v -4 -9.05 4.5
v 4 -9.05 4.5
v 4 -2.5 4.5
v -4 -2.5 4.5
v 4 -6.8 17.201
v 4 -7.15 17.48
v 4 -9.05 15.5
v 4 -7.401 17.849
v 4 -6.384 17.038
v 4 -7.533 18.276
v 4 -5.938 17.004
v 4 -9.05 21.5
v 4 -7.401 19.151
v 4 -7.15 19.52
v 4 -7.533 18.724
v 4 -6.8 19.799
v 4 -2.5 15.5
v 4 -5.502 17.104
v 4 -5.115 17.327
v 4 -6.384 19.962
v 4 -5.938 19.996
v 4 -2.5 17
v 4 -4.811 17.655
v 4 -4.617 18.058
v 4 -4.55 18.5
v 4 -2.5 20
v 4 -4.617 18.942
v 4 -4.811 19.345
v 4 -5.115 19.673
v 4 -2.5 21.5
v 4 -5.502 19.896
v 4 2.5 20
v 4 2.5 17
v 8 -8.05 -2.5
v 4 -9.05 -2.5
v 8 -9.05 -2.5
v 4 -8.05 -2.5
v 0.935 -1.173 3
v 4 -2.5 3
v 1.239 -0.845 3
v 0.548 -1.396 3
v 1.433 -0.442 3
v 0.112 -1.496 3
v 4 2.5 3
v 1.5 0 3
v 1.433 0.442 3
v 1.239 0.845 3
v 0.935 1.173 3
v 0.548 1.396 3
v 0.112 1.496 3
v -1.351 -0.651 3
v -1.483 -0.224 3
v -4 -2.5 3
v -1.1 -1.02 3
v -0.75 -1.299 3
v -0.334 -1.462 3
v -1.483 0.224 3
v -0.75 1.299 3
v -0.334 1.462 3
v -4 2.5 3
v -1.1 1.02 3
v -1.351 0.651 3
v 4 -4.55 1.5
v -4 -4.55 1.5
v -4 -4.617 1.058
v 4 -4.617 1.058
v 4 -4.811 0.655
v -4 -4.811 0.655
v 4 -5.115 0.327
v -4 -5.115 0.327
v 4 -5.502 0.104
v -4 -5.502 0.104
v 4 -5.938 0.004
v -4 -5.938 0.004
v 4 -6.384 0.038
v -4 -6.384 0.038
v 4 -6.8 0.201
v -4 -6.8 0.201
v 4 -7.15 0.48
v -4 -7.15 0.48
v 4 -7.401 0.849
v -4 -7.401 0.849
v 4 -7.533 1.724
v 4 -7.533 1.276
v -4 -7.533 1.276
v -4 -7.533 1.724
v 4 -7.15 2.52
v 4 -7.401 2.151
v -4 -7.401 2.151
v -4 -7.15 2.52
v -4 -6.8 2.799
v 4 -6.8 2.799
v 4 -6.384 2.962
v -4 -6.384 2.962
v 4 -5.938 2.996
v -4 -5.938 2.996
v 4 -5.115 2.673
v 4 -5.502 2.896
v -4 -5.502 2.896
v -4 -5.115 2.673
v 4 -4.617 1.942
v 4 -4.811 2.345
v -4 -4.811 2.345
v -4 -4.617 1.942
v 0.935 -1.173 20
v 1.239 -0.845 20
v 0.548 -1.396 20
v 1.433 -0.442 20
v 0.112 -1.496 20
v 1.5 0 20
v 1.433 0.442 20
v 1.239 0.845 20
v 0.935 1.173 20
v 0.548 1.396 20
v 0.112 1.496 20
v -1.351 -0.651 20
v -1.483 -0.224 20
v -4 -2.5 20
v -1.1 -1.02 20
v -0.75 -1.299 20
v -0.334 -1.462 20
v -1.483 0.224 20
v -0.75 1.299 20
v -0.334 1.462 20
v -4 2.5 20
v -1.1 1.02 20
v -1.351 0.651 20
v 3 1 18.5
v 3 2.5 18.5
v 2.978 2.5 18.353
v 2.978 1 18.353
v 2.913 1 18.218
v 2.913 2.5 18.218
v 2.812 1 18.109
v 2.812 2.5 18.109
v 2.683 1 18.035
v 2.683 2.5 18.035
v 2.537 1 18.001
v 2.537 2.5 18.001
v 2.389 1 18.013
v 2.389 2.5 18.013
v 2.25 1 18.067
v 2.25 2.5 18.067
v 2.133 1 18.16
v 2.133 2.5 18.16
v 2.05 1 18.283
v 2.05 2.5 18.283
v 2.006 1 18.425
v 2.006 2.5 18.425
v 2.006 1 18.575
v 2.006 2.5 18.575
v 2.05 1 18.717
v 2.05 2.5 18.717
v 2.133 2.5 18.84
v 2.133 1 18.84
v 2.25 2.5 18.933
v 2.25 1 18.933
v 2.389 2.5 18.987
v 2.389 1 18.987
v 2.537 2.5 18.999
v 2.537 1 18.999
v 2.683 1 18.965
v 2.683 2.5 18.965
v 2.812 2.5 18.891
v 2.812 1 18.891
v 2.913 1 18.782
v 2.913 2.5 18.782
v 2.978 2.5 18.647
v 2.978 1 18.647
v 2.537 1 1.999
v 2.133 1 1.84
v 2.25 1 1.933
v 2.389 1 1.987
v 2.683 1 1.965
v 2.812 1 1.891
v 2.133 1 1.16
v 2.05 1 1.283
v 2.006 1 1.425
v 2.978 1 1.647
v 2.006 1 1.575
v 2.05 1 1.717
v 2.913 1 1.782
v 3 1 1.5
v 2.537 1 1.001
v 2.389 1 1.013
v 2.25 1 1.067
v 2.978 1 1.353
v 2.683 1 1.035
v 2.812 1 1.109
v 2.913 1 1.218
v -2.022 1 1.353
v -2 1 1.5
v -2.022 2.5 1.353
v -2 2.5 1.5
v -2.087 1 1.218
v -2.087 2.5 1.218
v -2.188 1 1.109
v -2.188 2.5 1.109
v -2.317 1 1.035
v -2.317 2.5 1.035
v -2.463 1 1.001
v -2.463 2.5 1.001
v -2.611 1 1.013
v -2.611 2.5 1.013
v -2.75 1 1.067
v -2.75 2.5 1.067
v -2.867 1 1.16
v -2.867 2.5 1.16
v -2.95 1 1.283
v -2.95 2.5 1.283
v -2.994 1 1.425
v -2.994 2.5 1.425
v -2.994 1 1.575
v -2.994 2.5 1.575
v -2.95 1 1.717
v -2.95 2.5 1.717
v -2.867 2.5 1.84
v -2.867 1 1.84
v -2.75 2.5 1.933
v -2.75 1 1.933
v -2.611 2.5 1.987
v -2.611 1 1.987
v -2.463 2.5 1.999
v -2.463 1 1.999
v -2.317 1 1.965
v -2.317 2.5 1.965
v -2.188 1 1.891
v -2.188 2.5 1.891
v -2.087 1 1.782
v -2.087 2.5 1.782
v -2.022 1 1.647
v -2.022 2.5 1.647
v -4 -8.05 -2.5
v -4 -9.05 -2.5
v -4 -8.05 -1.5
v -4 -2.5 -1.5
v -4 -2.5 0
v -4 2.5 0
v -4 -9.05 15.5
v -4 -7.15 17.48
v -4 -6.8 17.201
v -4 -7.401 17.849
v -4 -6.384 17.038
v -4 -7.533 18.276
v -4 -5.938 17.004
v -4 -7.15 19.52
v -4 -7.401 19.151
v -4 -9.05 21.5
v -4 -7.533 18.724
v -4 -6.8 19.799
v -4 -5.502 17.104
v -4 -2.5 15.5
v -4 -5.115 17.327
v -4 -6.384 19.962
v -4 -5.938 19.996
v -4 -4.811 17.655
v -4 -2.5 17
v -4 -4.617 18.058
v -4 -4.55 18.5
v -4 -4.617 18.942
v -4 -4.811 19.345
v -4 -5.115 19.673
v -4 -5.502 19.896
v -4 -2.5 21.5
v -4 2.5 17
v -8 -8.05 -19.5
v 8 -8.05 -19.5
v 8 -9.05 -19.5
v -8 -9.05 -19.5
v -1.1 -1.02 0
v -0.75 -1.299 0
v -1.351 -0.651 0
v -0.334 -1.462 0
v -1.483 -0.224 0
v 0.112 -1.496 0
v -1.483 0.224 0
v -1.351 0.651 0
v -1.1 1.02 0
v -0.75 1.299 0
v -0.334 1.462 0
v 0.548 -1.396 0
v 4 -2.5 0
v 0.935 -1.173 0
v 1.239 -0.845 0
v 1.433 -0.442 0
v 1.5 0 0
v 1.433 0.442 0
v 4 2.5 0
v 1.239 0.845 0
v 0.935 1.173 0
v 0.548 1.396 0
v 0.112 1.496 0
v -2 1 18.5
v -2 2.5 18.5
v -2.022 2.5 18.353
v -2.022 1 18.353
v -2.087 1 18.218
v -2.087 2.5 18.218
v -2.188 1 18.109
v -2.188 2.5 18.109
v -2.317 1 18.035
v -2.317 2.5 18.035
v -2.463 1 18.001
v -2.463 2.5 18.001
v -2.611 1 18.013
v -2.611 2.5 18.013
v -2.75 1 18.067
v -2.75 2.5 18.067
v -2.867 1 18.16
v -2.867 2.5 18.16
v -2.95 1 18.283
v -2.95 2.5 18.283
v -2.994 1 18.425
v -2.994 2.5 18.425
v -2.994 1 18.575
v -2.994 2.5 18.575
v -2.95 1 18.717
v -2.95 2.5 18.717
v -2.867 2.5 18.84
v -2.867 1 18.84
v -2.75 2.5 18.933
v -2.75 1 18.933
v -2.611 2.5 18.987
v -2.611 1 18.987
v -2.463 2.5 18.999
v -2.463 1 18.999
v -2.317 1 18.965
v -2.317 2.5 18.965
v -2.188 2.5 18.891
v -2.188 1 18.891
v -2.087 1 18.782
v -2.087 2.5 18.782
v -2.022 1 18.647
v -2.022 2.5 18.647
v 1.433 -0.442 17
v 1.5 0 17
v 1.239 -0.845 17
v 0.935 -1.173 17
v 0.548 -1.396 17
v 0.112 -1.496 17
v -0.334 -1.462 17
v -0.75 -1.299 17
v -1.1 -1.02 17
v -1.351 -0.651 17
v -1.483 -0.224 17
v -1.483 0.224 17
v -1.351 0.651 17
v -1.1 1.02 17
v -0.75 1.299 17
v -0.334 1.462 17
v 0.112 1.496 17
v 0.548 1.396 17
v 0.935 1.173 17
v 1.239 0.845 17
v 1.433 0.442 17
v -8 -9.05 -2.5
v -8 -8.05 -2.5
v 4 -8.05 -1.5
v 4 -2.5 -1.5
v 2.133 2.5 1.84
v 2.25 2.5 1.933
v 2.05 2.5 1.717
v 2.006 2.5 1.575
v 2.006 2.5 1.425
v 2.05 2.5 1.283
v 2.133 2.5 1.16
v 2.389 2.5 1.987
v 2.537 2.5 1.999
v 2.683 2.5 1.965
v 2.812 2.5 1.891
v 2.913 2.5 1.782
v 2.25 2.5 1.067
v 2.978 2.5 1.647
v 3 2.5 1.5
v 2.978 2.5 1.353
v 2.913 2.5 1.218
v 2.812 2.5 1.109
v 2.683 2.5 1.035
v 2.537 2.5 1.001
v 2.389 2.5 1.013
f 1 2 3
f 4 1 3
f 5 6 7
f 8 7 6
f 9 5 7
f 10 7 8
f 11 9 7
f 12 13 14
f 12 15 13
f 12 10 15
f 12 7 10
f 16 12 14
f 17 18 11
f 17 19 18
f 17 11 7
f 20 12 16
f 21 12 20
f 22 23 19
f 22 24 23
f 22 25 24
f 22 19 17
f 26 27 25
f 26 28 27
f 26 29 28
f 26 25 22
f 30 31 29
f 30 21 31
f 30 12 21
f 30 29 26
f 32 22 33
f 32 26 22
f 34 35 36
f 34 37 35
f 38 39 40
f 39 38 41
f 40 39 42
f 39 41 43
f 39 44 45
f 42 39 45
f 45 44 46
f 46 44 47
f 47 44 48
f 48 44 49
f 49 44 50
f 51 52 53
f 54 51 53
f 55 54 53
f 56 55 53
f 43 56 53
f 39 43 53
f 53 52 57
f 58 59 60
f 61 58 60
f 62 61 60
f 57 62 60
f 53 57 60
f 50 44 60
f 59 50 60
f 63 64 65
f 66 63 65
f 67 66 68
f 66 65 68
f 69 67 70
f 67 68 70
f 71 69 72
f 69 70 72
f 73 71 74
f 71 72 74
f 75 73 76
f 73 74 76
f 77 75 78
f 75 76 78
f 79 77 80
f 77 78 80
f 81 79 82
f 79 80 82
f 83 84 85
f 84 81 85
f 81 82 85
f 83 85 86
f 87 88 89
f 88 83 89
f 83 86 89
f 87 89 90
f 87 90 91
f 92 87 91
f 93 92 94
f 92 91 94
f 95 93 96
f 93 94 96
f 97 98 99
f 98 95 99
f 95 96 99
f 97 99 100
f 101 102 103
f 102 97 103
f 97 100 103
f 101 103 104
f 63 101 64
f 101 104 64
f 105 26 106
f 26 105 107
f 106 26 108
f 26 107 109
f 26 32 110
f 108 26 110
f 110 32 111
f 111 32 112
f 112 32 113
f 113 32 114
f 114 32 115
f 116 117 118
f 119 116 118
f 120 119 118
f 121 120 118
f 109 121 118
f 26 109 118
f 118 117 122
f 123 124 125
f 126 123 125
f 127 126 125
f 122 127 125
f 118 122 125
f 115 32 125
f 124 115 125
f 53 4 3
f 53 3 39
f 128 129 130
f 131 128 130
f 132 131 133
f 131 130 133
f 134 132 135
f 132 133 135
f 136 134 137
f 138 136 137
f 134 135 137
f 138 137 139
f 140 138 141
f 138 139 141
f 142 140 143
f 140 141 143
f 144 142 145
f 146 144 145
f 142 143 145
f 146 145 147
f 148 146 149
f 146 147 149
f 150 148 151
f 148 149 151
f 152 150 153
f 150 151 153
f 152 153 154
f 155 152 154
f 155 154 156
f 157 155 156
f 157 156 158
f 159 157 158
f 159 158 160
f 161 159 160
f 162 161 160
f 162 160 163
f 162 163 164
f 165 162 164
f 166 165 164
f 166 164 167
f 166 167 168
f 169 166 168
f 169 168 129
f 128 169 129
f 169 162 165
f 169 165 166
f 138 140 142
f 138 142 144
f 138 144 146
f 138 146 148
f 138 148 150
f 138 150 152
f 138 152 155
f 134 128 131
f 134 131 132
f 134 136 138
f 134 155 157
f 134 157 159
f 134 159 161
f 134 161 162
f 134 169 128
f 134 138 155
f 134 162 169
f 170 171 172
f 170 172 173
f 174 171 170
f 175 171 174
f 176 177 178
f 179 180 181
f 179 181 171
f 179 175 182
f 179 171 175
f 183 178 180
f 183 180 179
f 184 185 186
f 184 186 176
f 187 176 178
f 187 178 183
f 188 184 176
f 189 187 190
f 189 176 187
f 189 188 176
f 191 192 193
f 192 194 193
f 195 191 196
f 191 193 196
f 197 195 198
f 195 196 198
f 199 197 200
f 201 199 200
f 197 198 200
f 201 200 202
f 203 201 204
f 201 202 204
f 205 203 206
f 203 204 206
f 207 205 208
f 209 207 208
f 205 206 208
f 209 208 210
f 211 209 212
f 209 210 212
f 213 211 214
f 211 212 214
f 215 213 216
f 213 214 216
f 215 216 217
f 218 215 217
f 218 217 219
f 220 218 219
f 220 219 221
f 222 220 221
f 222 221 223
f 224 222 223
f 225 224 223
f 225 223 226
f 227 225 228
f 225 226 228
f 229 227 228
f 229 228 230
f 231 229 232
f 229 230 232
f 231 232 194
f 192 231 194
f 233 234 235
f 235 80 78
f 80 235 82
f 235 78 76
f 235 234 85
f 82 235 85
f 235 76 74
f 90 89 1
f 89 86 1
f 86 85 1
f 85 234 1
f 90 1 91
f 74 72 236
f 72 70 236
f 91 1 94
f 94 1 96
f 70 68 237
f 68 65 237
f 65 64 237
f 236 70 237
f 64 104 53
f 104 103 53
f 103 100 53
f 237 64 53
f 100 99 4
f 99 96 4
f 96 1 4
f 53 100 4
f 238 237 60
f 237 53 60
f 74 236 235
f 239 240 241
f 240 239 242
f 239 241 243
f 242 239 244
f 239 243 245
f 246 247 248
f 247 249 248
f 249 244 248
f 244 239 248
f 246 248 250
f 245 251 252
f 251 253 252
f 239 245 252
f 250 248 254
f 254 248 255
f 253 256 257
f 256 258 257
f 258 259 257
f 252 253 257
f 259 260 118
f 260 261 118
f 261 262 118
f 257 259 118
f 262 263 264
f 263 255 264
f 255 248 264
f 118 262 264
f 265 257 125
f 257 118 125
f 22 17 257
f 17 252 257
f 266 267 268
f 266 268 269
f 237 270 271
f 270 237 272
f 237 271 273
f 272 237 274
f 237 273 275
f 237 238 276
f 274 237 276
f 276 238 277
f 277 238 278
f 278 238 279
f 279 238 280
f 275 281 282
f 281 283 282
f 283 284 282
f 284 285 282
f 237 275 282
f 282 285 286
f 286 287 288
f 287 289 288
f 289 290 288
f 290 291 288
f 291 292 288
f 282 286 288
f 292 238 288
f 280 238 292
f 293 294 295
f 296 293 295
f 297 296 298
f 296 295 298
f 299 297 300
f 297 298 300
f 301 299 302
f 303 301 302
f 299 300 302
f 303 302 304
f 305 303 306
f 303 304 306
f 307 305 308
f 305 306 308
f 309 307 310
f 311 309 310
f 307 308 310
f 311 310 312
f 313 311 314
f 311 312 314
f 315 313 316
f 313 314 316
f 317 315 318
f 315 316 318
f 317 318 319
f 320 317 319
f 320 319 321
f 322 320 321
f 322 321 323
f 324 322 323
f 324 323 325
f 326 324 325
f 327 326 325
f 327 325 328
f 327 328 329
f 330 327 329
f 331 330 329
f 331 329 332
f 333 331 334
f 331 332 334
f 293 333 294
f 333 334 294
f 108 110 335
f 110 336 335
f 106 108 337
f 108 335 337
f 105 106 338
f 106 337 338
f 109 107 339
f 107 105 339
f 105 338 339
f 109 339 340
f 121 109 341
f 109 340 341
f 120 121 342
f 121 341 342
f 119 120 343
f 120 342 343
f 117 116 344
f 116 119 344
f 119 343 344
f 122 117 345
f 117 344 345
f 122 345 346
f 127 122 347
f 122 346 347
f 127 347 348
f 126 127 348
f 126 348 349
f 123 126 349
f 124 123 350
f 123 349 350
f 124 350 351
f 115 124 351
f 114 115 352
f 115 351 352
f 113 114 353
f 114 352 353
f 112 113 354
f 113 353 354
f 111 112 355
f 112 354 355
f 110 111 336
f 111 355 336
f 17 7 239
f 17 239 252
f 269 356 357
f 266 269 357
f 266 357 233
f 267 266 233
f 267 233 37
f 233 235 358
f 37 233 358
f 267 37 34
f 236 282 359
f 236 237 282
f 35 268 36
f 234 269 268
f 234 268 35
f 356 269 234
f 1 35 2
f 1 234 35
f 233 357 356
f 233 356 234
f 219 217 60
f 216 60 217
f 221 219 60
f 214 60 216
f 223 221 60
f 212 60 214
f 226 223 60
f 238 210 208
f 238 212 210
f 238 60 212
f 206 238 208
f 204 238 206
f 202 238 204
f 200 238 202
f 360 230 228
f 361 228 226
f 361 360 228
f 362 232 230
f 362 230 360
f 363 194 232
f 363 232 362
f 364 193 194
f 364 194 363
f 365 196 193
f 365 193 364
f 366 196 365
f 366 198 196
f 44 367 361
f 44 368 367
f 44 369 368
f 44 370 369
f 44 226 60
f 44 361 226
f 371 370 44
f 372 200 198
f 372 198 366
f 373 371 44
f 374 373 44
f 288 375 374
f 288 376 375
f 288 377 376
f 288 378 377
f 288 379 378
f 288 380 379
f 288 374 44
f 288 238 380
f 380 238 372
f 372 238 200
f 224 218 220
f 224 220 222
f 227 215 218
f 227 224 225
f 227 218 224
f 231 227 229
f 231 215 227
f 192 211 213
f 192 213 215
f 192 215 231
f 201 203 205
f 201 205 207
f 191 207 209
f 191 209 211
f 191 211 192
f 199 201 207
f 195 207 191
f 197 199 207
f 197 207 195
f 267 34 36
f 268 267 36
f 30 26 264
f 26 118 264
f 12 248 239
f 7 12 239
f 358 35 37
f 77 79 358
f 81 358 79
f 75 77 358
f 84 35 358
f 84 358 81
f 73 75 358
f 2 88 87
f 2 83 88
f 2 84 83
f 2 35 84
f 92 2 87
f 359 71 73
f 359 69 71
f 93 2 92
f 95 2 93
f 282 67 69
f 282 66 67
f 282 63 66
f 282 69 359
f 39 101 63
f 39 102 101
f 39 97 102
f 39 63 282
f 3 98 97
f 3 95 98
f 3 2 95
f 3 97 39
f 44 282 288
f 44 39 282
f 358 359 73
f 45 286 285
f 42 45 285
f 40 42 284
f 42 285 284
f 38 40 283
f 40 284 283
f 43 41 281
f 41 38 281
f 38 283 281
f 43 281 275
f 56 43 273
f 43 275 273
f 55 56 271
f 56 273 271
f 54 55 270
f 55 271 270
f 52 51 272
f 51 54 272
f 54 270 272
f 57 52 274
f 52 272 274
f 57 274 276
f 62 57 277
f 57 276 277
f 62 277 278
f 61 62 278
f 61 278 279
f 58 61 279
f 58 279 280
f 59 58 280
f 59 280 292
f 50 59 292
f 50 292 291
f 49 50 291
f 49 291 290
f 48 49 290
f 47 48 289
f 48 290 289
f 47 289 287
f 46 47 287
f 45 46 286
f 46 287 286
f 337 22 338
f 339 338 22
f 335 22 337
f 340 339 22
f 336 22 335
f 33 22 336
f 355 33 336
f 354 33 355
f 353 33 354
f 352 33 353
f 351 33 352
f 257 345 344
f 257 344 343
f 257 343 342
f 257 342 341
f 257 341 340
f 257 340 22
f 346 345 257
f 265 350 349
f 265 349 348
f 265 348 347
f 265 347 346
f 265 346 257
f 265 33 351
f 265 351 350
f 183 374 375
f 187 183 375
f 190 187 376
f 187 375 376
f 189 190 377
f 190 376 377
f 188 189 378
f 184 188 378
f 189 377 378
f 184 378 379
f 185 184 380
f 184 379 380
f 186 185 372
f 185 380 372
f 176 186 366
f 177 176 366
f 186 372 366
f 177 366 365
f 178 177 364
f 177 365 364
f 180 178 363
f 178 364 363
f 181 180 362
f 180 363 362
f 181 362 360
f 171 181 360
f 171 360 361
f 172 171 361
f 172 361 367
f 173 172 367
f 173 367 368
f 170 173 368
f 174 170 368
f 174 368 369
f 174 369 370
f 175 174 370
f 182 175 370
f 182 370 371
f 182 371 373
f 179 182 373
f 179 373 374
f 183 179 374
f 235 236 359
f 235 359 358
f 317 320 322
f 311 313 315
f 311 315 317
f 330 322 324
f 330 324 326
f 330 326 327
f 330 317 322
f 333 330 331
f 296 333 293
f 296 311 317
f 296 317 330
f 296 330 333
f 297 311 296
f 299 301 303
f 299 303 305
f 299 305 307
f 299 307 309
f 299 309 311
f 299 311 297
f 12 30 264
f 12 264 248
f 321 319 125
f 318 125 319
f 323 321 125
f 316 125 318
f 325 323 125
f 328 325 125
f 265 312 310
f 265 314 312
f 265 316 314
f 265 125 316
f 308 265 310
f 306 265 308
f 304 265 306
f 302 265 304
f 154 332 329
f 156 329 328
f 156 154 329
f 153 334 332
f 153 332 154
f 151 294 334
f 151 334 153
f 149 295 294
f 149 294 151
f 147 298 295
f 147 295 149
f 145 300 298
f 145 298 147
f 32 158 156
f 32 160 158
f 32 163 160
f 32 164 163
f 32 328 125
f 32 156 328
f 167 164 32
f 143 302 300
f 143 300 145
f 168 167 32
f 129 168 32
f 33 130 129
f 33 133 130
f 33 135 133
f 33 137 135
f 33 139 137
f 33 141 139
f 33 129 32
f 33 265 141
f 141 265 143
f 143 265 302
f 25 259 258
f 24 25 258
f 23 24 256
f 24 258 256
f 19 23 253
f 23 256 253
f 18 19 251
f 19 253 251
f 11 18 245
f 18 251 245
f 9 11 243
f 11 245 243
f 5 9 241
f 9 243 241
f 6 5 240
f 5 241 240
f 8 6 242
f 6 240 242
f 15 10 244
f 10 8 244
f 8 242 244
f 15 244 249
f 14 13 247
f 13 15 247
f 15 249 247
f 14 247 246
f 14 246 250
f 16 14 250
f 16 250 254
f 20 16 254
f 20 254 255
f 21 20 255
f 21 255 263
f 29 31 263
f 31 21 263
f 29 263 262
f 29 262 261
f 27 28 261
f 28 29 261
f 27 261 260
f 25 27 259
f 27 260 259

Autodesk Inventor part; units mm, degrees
ref_plane "YZ Plane" through (0, 0, 0) normal (1, 0, 0) x (0, 1, 0)
ref_plane "XZ Plane" through (0, 0, 0) normal (0, 1, 0) x (-1, 0, 0)
ref_plane "XY Plane" through (0, 0, 0) normal (0, 0, 1) x (1, 0, 0)
sketch "Sketch1" plane through (0, 0, 0) normal (0, 0, 1) x (1, 0, 0)
  circle A0 centre (0, 0) radius 1.5
  line L0 (2.5, 2.5) -> (2.5, -2.5)
  line L1 (2.5, -2.5) -> (-2.5, -2.5)
  line L2 (-2.5, -2.5) -> (-2.5, 2.5)
  line L3 (-2.5, 2.5) -> (2.5, 2.5)
  dimension "d0" = 3
  dimension "d1" = 5
extrude "Extrusion1" add sketch "Sketch1" along normal blind 3
pattern_linear "Rectangular Pattern1" count 2 spacing 17 along (0, 0, 1) of "Extrusion1"
sketch "Sketch2" plane through (0, 0, 0) normal (1, 0, 0) x (0, 1, 0)
  line L0 (-2.5, 17) -> (-2.5, 20) projected
  line L1 (-2.5, 0) -> (-2.5, 3) projected
  line L2 (-2.5, 18.5) -> (-6.05, 18.5) construction
  line L3 (-6.05, 18.5) -> (-6.05, 1.5) construction
  line L4 (-6.05, 1.5) -> (-2.5, 1.5) construction
  line L5 (2.5, 3) -> (-2.5, 3) projected
  line L6 (2.5, 17) -> (-2.5, 17) projected
  line L7 (0, 16.4638) -> (0, 3) construction
  circle A0 centre (-6.05, 18.5) radius 1.5
  circle A1 centre (-6.05, 1.5) radius 1.5
  line L8 (-2.5, 20) -> (-2.5, 21.5)
  line L9 (-2.5, 21.5) -> (-9.05, 21.5)
  line L10 (-9.05, 21.5) -> (-9.05, 15.5)
  line L11 (-9.05, 15.5) -> (-2.5, 15.5)
  line L12 (-2.5, 15.5) -> (-2.5, 17)
  line L13 (-6.05, 10) -> (0, 10) construction
  line L14 (-2.5, 3) -> (-2.5, 0)
  line L15 (-2.5, 1.5) -> (-6.05, 1.5) construction
  circle A2 centre (-6.05, 1.5) radius 1.5
  line L16 (-2.5, 0) -> (-2.5, -1.5)
  line L17 (-2.5, -1.5) -> (-9.05, -1.5)
  line L18 (-9.05, -1.5) -> (-9.05, 4.5)
  line L19 (-9.05, 4.5) -> (-2.5, 4.5)
  line L20 (-2.5, 4.5) -> (-2.5, 3)
  line L21 (-2.5, 17) -> (-2.5, 20)
  dimension "d7" = 6.05
  dimension "d8" = 3
  dimension "d9" = 3
  dimension "d10" = 3
  dimension "d11" = 3
extrude "Extrusion2" add sketch "Sketch2" along normal mid plane 8
sketch "Sketch4" plane through (4, -9.05, -1.5) normal (0, 0, -1) x (-1, 0, 0)
  line L0 (8, 0) -> (0, 0) projected
  line L1 (8, 0) -> (8, 6.55) projected
  line L2 (0, 0) -> (8, 0)
  line L3 (8, 0) -> (8, 1)
  line L4 (8, 1) -> (0, 1)
  line L5 (0, 1) -> (0, 0)
  line L6 (0, 1) -> (-4, 1)
  line L7 (-4, 1) -> (-4, 0)
  line L8 (-4, 0) -> (0, 0)
  line L9 (0, 0) -> (0, 1)
  line L10 (8, 0) -> (12, 0)
  line L11 (12, 0) -> (12, 1)
  line L12 (12, 1) -> (8, 1)
  line L13 (8, 1) -> (8, 0)
  circle A0 centre (4, 9.05) radius 1.5 projected
  circle A1 centre (4, 9.05) radius 8.05 construction
  dimension "d14" = 1
  dimension "d15" = 16
  dimension "d16" = 16.1
  dimension "d17" = 0
extrude "Extrusion3" add sketch "Sketch4" along normal blind 18 contours L0 L5 L4 L1 | L1 L12 L11 L10 | L8 L7 L6 L5
sketch "Sketch5" plane through (4, -9.05, -1.5) normal (0, 0, 1) x (1, 0, 0)
  line L0 (0, 1) -> (0, 0) projected
  line L1 (4, 0) -> (0, 0) projected
  line L2 (4, 1) -> (4, 0) projected
  line L3 (0, 1) -> (4, 1) projected
  line L4 (-8, 0) -> (-8, 1) projected
  line L5 (-12, 1) -> (-8, 1) projected
  line L6 (-12, 0) -> (-12, 1) projected
  line L7 (-8, 0) -> (-12, 0) projected
extrude "Extrusion4" cut sketch "Sketch5" against normal blind 1
sketch "Sketch6" plane through (-2.5, 2.5, 0) normal (0, 1, 0) x (1, 0, 0)
  line L0 (0, -20) -> (5, -20) projected
  line L1 (5, -17) -> (5, -20) projected
  line L2 (0, -17) -> (5, -17) projected
  line L3 (0, -17) -> (0, -20) projected
  line L4 (6.5, -21.5) -> (6.5, -15.5) projected
  line L5 (-1.5, -15.5) -> (6.5, -15.5) projected
  line L6 (-1.5, -15.5) -> (-1.5, -21.5) projected
  line L7 (-1.5, -21.5) -> (6.5, -21.5) projected
  line L8 (5, -17) -> (5, -20) projected
  line L9 (5, -20) -> (0, -20) projected
  line L10 (0, -17) -> (0, -20) projected
  line L11 (5, -17) -> (0, -17) projected
  line L12 (6.5, -4.5) -> (6.5, 1.5) projected
  line L13 (-1.5, 1.5) -> (6.5, 1.5) projected
  line L14 (-1.5, 1.5) -> (-1.5, -4.5) projected
  line L15 (-1.5, -4.5) -> (6.5, -4.5) projected
  line L16 (5, 0) -> (5, -3) projected
  line L17 (5, -3) -> (0, -3) projected
  line L18 (0, 0) -> (0, -3) projected
  line L19 (5, 0) -> (0, 0) projected
  line L20 (0, -3) -> (-1.5, -3)
  line L21 (0, 0) -> (-1.5, 0)
  line L22 (5, -3) -> (6.5, -3)
  line L23 (5, 0) -> (6.5, 0)
  line L24 (5, -20) -> (6.5, -20)
  line L25 (5, -17) -> (6.5, -17)
  line L26 (0, -17) -> (-1.5, -17)
  line L27 (0, -20) -> (-1.5, -20)
extrude "Extrusion5" add sketch "Sketch6" against normal up to surface (5 mm away) contours L27 L6 L26 L3 | L1 L25 L4 L24 | L22 L16 L23 L12 | L14 L21 L18 L20
sketch "Sketch7" plane through (4, 2.5, 20) normal (0, 1, 0) x (1, 0, 0)
  line L0 (0, 0) -> (0, 3) projected
  line L1 (-8, 3) -> (-8, 0) projected
  line L2 (-8, 17) -> (0, 17) projected
  line L3 (0, 17) -> (0, 20) projected
  line L4 (0, 20) -> (-8, 20) projected
  line L5 (-8, 20) -> (-8, 17) projected
  line L6 (-8, 18.5) -> (0, 18.5) construction
  line L7 (-8, 1.5) -> (0, 1.5) construction
  line L8 (-4, 18.5) -> (-4, 1.5) construction
  circle A0 centre (-6.5, 18.5) radius 0.5
  line L9 (-4, 10) -> (-9.0757, 10) construction
  line L10 (0, 1.5) -> (-8, 1.5) construction
  circle A1 centre (-1.5, 18.5) radius 0.5
  circle A2 centre (-6.5, 1.5) radius 0.5
  circle A3 centre (-1.5, 1.5) radius 0.5
  dimension "d24" = 1
  dimension "d25" = 2.5
extrude "Extrusion6" cut sketch "Sketch7" against normal blind 1.5 contours A0 | A1 | A2 | A3
thread "Thread1" size "M1x0.25" class "6H" standard "ANSI Metric M Profile" full length
thread "Thread2" size "M1x0.25" class "6H" standard "ANSI Metric M Profile" full length
thread "Thread3" size "M1x0.25" class "6H" standard "ANSI Metric M Profile" full length
thread "Thread4" size "M1x0.25" class "6H" standard "ANSI Metric M Profile" full length
properties part number "Bearing1"
